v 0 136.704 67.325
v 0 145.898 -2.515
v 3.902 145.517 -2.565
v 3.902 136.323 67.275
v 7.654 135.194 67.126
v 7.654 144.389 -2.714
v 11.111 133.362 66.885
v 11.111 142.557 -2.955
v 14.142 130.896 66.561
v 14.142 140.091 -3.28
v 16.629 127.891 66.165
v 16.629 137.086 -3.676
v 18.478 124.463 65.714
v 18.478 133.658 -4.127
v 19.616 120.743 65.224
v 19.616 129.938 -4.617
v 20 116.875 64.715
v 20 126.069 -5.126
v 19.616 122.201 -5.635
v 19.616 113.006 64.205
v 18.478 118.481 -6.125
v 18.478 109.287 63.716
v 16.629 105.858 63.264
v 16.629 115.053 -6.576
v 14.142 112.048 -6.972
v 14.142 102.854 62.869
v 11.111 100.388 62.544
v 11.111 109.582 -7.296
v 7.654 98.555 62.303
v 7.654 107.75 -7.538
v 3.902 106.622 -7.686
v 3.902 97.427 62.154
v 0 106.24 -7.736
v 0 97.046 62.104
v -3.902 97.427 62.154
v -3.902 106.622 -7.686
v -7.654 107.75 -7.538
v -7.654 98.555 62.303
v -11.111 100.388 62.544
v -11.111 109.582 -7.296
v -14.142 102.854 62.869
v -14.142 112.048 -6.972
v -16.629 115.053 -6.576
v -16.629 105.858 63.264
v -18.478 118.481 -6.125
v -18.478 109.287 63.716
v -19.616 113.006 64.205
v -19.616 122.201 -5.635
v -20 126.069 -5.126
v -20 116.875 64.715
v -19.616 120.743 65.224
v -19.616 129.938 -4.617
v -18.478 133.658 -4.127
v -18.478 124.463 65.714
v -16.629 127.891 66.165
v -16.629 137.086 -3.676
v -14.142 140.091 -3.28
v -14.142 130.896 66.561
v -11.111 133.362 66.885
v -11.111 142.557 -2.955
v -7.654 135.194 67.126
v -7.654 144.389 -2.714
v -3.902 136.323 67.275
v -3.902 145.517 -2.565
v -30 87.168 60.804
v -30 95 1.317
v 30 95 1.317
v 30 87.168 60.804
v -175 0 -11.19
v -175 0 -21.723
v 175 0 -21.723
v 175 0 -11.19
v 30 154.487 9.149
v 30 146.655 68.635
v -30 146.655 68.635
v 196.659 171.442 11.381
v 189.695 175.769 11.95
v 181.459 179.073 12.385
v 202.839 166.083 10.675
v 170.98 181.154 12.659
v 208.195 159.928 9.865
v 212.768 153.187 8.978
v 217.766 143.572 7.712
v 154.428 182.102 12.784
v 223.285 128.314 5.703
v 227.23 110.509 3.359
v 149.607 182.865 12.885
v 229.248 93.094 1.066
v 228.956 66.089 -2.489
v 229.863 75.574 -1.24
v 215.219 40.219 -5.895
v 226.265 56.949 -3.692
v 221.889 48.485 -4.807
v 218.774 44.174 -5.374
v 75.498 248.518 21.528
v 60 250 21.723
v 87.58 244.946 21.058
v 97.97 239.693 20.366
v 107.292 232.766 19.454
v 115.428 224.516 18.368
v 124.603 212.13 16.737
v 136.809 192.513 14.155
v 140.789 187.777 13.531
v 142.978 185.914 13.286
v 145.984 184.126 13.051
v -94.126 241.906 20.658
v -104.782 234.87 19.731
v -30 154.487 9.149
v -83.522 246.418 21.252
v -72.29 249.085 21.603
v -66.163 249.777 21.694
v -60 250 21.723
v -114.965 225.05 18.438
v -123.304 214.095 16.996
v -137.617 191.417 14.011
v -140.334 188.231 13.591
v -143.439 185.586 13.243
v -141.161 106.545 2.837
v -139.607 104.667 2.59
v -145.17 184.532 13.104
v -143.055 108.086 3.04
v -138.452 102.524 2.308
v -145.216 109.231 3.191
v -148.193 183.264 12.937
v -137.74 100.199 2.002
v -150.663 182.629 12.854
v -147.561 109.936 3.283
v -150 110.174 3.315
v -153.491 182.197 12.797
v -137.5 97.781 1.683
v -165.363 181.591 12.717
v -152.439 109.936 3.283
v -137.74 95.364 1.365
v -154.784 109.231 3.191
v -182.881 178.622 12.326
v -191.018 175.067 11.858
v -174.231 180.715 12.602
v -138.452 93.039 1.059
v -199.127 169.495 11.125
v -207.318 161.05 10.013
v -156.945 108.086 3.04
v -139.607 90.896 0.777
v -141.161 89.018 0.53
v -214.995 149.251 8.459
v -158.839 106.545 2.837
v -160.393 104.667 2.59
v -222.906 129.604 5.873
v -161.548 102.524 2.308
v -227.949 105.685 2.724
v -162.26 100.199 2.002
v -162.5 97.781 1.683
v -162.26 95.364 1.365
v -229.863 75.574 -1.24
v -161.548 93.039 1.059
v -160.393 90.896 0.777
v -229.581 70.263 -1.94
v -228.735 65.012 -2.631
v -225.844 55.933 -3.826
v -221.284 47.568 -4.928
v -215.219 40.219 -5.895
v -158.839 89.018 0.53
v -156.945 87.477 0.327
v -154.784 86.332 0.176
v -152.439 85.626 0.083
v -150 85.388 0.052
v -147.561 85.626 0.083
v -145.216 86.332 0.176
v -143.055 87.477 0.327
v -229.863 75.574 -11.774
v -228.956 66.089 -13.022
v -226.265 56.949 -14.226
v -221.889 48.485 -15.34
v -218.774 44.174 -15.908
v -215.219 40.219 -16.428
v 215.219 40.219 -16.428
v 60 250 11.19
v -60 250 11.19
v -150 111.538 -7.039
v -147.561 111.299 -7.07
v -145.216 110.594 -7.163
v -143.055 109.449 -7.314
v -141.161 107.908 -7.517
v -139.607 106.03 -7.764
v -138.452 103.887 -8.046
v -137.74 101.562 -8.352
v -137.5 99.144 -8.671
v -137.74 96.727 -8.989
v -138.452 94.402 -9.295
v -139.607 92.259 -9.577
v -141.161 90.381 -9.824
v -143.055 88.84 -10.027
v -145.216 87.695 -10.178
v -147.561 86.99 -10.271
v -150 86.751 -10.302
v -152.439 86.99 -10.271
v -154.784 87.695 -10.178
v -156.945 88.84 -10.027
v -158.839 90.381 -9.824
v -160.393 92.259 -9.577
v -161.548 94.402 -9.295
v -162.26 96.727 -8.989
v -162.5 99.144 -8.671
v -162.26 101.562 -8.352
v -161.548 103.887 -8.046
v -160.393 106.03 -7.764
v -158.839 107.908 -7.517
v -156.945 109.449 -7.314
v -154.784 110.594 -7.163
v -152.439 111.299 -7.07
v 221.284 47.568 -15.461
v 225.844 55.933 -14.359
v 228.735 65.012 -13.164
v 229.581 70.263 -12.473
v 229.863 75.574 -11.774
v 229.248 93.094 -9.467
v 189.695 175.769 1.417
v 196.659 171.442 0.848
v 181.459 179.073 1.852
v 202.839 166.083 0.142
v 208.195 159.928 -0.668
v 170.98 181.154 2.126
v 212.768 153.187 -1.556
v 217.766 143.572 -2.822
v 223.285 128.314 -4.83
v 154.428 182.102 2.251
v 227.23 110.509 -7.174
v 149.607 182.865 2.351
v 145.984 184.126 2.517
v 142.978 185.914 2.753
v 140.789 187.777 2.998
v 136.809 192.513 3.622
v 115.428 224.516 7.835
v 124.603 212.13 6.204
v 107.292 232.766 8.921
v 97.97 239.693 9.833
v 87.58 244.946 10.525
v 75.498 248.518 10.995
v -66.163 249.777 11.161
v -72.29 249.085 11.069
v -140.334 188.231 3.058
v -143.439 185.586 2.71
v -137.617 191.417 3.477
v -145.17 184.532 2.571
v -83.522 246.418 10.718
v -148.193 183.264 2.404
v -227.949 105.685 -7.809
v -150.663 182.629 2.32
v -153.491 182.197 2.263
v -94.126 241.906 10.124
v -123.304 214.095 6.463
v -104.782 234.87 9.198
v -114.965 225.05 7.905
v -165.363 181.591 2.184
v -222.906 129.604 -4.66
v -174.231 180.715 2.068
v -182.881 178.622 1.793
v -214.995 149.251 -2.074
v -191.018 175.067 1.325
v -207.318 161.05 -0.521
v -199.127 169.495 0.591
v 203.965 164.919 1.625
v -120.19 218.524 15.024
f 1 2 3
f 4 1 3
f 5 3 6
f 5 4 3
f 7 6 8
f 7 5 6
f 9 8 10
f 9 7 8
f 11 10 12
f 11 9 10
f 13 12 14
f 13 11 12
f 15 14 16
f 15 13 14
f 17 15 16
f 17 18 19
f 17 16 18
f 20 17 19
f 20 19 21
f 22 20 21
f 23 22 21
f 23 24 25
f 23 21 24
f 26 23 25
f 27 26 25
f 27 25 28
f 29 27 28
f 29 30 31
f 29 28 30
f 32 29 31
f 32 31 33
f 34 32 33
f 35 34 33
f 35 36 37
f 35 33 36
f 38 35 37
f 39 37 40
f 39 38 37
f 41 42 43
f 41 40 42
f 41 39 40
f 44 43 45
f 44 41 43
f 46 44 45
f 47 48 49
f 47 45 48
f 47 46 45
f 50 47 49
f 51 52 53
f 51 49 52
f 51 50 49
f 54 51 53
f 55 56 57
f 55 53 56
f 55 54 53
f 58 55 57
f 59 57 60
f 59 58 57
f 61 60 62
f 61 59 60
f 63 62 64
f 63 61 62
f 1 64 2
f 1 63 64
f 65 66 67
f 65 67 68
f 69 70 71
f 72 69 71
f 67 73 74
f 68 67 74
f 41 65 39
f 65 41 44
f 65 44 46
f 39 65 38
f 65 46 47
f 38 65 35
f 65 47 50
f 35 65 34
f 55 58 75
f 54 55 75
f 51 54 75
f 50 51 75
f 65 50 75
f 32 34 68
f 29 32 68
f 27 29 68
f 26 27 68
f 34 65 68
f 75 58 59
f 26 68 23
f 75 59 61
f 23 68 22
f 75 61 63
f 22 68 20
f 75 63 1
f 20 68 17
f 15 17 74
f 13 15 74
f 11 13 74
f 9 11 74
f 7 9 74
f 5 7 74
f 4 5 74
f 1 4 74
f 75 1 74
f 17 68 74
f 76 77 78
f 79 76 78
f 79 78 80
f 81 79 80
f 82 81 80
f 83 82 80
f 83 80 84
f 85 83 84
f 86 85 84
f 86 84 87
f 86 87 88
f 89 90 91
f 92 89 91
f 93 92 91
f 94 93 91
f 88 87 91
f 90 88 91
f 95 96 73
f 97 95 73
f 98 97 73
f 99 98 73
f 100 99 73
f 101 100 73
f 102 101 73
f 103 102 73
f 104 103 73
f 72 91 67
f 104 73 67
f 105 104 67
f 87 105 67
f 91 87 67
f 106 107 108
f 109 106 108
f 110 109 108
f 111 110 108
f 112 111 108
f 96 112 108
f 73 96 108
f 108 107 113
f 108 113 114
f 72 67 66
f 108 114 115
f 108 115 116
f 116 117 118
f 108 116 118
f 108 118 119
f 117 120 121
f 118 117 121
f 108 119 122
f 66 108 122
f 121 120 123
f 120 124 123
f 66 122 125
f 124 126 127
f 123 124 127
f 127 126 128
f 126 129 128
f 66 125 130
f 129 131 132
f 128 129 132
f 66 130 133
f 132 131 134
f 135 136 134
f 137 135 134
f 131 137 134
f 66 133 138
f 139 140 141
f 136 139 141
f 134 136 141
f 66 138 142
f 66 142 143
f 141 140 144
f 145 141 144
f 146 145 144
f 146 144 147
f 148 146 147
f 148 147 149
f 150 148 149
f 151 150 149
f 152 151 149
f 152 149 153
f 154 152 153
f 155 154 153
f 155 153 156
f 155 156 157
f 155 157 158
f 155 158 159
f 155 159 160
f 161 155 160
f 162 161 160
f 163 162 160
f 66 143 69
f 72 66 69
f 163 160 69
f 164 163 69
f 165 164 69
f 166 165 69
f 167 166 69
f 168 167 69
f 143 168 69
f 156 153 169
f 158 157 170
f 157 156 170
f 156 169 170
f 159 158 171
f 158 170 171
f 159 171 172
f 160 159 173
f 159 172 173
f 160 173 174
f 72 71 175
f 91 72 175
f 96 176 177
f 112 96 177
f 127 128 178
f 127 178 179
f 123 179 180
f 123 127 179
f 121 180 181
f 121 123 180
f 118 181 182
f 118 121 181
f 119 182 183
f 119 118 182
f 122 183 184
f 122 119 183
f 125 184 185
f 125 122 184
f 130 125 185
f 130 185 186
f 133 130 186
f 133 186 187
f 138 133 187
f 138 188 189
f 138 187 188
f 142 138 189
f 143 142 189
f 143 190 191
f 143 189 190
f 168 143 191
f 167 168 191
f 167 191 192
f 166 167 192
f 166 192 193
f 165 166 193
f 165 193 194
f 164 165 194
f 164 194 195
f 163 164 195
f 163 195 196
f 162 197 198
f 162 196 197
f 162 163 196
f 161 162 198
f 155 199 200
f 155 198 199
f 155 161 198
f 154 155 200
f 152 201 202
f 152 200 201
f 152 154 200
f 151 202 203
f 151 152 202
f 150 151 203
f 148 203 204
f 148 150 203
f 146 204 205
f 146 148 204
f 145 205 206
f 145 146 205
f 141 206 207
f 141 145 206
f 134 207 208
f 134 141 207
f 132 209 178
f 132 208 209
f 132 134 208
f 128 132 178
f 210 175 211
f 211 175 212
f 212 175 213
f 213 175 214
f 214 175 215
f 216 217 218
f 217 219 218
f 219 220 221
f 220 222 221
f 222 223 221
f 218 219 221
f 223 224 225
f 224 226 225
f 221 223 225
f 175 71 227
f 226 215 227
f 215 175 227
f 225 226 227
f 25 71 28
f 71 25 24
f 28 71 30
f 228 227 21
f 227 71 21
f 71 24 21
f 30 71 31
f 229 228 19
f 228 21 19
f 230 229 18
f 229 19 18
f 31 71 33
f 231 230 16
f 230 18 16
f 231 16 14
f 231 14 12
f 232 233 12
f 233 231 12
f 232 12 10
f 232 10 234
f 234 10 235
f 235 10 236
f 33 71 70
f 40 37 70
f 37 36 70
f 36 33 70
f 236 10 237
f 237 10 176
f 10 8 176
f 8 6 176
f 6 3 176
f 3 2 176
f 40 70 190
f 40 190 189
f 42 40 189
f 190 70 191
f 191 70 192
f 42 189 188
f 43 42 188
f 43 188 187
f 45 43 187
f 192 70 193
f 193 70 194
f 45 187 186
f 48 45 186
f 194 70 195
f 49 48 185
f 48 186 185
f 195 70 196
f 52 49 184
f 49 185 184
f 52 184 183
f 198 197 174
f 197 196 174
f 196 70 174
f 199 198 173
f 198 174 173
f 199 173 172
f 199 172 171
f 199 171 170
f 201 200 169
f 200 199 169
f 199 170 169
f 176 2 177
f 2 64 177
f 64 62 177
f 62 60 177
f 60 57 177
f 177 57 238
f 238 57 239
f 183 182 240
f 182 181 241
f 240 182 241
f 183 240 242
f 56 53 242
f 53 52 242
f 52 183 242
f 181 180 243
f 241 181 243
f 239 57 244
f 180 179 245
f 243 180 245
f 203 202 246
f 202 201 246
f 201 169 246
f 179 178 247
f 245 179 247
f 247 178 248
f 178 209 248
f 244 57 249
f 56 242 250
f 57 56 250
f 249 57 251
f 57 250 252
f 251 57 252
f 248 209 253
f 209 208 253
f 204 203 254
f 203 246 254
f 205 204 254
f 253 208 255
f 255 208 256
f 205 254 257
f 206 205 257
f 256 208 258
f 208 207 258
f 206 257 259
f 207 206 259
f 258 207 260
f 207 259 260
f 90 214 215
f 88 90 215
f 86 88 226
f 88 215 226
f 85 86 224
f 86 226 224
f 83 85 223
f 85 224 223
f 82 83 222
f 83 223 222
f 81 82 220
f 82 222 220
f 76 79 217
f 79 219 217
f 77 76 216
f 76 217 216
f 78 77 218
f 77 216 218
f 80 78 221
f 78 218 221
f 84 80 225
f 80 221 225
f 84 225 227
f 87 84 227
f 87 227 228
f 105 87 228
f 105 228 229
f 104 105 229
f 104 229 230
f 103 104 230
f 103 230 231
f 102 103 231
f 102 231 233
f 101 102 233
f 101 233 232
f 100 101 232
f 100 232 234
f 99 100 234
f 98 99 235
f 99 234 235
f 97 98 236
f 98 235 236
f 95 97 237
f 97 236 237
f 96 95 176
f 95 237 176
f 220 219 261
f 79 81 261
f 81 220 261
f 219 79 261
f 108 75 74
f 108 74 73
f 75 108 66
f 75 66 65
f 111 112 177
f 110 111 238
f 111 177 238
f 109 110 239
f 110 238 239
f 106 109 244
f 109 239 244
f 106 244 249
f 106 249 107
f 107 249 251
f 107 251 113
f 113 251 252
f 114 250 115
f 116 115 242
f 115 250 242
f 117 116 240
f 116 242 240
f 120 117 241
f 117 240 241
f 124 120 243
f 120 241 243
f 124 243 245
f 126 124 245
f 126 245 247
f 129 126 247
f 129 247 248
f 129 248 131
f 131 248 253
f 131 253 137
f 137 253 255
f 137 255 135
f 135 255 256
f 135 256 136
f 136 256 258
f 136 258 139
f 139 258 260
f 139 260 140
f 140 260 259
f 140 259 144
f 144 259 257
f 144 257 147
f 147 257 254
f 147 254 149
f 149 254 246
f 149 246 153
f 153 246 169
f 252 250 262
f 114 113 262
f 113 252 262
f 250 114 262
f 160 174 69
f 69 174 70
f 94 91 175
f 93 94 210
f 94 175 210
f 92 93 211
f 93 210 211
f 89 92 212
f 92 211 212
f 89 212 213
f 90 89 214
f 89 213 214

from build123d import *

# Parameters (mm, degrees)
BOSS_EXTRUDE1_START     = -25
BOSS_EXTRUDE1_DEPTH     = 50
CUT_EXTRUDE1_DEPTH      = 341.53226913
CUT_EXTRUDE1_DEPTH_BACK = 341.53226913
BOSS_EXTRUDE3_DEPTH     = 30
CUT_EXTRUDE2_DEPTH      = 350.338594582
CUT_EXTRUDE2_DEPTH_BACK = 350.338594582
SKETCH4_R               = 20
CUT_EXTRUDE3_DEPTH      = 350.338594582
CUT_EXTRUDE3_DEPTH_BACK = 350.338594582
SKETCH6_R               = 12.5


# Read off the part's stored shape, not the designer's step: Boss-Extrude1
with BuildPart() as part:
    # Boss-Extrude1 outline → Boss-Extrude1 (new body)
    with BuildSketch(Plane.XY.offset(BOSS_EXTRUDE1_START)):
        with BuildLine():
            Line((175, 0), (215.218833807, 40.218833807))
            ThreePointArc((215.218833807, 40.218833807), (226.057471223, 56.440000887), (229.863494748, 75.574172084))
            add(Edge.make_bspline(
                [(229.863494748, 75.574172084), (229.863497015, 220.574172084), (130.657195822, 208), (130.657198498, 108), (160, 250), (60, 250)],
                knots=[0, 0, 0, 0, 0, 0, 1, 1, 1, 1, 1, 1], degree=5))
            Line((60, 250), (-60, 250))
            add(Edge.make_bspline(
                [(-60, 250), (-160, 250), (-130.657198498, 108), (-130.657195822, 208), (-229.863497015, 220.574172084), (-229.863494748, 75.574172084)],
                knots=[0, 0, 0, 0, 0, 0, 1, 1, 1, 1, 1, 1], degree=5))
            ThreePointArc((-229.863494748, 75.574172084), (-226.057471223, 56.440000887), (-215.218833807, 40.218833807))
            Line((-215.218833807, 40.218833807), (-175, 0))
            Line((-175, 0), (175, 0))
        make_face()
    extrude(amount=BOSS_EXTRUDE1_DEPTH)

    # Sketch2 → Cut-Extrude1 (cut, two sides: drawn at the far end of the back side and taken through both)
    with BuildSketch(Plane(origin=(0, 0, 0), x_dir=(0, 0, -1), z_dir=(1, 0, 0)).offset(-CUT_EXTRUDE1_DEPTH_BACK)):
        Polygon((23.039732542, -10), (-12.506441807, 260), (35, 260), (35, -10), align=None)
        Polygon((-23.039732542, 260), (12.506441807, -10), (-35, -10), (-35, 260), align=None)
    extrude(amount=CUT_EXTRUDE1_DEPTH + CUT_EXTRUDE1_DEPTH_BACK, mode=Mode.SUBTRACT)

    # Sketch11 → Boss-Extrude3 (add, symmetric)
    with BuildSketch(Plane(origin=(0, 0, 0), x_dir=(0, 0, -1), z_dir=(1, 0, 0))):
        Polygon((-9.148641973, 154.486691682), (-1.31707044, 95), (-60.803762122, 87.168428467), (-68.635333655, 146.655120149), align=None)
    extrude(amount=BOSS_EXTRUDE3_DEPTH, both=True)

    # Sketch4 → Cut-Extrude2 (cut, two sides: drawn at the far end of the back side and taken through both)
    with BuildSketch(Plane(origin=(0, 2.811189919, -21.353107392), x_dir=(-1, 0, 0), z_dir=(0, 0.13052619222005532, -0.99144486137381)).offset(-CUT_EXTRUDE2_DEPTH_BACK)):
        with Locations(Location((0, 124.321792579, 0), (0, 0, 90))):
            Circle(SKETCH4_R)
    extrude(amount=CUT_EXTRUDE2_DEPTH + CUT_EXTRUDE2_DEPTH_BACK, mode=Mode.SUBTRACT)

    # Sketch6 → Cut-Extrude3 (cut, two sides: drawn at the far end of the back side and taken through both)
    with BuildSketch(Plane(origin=(0, 2.811189919, -21.353107392), x_dir=(-1, 0, 0), z_dir=(0, 0.13052619222005532, -0.99144486137381)).offset(-CUT_EXTRUDE3_DEPTH_BACK)):
        with Locations(Location((150, 97.164552434, 0), (0, 0, 90))):
            Circle(SKETCH6_R)
    extrude(amount=CUT_EXTRUDE3_DEPTH + CUT_EXTRUDE3_DEPTH_BACK, mode=Mode.SUBTRACT)


solid = part.part
